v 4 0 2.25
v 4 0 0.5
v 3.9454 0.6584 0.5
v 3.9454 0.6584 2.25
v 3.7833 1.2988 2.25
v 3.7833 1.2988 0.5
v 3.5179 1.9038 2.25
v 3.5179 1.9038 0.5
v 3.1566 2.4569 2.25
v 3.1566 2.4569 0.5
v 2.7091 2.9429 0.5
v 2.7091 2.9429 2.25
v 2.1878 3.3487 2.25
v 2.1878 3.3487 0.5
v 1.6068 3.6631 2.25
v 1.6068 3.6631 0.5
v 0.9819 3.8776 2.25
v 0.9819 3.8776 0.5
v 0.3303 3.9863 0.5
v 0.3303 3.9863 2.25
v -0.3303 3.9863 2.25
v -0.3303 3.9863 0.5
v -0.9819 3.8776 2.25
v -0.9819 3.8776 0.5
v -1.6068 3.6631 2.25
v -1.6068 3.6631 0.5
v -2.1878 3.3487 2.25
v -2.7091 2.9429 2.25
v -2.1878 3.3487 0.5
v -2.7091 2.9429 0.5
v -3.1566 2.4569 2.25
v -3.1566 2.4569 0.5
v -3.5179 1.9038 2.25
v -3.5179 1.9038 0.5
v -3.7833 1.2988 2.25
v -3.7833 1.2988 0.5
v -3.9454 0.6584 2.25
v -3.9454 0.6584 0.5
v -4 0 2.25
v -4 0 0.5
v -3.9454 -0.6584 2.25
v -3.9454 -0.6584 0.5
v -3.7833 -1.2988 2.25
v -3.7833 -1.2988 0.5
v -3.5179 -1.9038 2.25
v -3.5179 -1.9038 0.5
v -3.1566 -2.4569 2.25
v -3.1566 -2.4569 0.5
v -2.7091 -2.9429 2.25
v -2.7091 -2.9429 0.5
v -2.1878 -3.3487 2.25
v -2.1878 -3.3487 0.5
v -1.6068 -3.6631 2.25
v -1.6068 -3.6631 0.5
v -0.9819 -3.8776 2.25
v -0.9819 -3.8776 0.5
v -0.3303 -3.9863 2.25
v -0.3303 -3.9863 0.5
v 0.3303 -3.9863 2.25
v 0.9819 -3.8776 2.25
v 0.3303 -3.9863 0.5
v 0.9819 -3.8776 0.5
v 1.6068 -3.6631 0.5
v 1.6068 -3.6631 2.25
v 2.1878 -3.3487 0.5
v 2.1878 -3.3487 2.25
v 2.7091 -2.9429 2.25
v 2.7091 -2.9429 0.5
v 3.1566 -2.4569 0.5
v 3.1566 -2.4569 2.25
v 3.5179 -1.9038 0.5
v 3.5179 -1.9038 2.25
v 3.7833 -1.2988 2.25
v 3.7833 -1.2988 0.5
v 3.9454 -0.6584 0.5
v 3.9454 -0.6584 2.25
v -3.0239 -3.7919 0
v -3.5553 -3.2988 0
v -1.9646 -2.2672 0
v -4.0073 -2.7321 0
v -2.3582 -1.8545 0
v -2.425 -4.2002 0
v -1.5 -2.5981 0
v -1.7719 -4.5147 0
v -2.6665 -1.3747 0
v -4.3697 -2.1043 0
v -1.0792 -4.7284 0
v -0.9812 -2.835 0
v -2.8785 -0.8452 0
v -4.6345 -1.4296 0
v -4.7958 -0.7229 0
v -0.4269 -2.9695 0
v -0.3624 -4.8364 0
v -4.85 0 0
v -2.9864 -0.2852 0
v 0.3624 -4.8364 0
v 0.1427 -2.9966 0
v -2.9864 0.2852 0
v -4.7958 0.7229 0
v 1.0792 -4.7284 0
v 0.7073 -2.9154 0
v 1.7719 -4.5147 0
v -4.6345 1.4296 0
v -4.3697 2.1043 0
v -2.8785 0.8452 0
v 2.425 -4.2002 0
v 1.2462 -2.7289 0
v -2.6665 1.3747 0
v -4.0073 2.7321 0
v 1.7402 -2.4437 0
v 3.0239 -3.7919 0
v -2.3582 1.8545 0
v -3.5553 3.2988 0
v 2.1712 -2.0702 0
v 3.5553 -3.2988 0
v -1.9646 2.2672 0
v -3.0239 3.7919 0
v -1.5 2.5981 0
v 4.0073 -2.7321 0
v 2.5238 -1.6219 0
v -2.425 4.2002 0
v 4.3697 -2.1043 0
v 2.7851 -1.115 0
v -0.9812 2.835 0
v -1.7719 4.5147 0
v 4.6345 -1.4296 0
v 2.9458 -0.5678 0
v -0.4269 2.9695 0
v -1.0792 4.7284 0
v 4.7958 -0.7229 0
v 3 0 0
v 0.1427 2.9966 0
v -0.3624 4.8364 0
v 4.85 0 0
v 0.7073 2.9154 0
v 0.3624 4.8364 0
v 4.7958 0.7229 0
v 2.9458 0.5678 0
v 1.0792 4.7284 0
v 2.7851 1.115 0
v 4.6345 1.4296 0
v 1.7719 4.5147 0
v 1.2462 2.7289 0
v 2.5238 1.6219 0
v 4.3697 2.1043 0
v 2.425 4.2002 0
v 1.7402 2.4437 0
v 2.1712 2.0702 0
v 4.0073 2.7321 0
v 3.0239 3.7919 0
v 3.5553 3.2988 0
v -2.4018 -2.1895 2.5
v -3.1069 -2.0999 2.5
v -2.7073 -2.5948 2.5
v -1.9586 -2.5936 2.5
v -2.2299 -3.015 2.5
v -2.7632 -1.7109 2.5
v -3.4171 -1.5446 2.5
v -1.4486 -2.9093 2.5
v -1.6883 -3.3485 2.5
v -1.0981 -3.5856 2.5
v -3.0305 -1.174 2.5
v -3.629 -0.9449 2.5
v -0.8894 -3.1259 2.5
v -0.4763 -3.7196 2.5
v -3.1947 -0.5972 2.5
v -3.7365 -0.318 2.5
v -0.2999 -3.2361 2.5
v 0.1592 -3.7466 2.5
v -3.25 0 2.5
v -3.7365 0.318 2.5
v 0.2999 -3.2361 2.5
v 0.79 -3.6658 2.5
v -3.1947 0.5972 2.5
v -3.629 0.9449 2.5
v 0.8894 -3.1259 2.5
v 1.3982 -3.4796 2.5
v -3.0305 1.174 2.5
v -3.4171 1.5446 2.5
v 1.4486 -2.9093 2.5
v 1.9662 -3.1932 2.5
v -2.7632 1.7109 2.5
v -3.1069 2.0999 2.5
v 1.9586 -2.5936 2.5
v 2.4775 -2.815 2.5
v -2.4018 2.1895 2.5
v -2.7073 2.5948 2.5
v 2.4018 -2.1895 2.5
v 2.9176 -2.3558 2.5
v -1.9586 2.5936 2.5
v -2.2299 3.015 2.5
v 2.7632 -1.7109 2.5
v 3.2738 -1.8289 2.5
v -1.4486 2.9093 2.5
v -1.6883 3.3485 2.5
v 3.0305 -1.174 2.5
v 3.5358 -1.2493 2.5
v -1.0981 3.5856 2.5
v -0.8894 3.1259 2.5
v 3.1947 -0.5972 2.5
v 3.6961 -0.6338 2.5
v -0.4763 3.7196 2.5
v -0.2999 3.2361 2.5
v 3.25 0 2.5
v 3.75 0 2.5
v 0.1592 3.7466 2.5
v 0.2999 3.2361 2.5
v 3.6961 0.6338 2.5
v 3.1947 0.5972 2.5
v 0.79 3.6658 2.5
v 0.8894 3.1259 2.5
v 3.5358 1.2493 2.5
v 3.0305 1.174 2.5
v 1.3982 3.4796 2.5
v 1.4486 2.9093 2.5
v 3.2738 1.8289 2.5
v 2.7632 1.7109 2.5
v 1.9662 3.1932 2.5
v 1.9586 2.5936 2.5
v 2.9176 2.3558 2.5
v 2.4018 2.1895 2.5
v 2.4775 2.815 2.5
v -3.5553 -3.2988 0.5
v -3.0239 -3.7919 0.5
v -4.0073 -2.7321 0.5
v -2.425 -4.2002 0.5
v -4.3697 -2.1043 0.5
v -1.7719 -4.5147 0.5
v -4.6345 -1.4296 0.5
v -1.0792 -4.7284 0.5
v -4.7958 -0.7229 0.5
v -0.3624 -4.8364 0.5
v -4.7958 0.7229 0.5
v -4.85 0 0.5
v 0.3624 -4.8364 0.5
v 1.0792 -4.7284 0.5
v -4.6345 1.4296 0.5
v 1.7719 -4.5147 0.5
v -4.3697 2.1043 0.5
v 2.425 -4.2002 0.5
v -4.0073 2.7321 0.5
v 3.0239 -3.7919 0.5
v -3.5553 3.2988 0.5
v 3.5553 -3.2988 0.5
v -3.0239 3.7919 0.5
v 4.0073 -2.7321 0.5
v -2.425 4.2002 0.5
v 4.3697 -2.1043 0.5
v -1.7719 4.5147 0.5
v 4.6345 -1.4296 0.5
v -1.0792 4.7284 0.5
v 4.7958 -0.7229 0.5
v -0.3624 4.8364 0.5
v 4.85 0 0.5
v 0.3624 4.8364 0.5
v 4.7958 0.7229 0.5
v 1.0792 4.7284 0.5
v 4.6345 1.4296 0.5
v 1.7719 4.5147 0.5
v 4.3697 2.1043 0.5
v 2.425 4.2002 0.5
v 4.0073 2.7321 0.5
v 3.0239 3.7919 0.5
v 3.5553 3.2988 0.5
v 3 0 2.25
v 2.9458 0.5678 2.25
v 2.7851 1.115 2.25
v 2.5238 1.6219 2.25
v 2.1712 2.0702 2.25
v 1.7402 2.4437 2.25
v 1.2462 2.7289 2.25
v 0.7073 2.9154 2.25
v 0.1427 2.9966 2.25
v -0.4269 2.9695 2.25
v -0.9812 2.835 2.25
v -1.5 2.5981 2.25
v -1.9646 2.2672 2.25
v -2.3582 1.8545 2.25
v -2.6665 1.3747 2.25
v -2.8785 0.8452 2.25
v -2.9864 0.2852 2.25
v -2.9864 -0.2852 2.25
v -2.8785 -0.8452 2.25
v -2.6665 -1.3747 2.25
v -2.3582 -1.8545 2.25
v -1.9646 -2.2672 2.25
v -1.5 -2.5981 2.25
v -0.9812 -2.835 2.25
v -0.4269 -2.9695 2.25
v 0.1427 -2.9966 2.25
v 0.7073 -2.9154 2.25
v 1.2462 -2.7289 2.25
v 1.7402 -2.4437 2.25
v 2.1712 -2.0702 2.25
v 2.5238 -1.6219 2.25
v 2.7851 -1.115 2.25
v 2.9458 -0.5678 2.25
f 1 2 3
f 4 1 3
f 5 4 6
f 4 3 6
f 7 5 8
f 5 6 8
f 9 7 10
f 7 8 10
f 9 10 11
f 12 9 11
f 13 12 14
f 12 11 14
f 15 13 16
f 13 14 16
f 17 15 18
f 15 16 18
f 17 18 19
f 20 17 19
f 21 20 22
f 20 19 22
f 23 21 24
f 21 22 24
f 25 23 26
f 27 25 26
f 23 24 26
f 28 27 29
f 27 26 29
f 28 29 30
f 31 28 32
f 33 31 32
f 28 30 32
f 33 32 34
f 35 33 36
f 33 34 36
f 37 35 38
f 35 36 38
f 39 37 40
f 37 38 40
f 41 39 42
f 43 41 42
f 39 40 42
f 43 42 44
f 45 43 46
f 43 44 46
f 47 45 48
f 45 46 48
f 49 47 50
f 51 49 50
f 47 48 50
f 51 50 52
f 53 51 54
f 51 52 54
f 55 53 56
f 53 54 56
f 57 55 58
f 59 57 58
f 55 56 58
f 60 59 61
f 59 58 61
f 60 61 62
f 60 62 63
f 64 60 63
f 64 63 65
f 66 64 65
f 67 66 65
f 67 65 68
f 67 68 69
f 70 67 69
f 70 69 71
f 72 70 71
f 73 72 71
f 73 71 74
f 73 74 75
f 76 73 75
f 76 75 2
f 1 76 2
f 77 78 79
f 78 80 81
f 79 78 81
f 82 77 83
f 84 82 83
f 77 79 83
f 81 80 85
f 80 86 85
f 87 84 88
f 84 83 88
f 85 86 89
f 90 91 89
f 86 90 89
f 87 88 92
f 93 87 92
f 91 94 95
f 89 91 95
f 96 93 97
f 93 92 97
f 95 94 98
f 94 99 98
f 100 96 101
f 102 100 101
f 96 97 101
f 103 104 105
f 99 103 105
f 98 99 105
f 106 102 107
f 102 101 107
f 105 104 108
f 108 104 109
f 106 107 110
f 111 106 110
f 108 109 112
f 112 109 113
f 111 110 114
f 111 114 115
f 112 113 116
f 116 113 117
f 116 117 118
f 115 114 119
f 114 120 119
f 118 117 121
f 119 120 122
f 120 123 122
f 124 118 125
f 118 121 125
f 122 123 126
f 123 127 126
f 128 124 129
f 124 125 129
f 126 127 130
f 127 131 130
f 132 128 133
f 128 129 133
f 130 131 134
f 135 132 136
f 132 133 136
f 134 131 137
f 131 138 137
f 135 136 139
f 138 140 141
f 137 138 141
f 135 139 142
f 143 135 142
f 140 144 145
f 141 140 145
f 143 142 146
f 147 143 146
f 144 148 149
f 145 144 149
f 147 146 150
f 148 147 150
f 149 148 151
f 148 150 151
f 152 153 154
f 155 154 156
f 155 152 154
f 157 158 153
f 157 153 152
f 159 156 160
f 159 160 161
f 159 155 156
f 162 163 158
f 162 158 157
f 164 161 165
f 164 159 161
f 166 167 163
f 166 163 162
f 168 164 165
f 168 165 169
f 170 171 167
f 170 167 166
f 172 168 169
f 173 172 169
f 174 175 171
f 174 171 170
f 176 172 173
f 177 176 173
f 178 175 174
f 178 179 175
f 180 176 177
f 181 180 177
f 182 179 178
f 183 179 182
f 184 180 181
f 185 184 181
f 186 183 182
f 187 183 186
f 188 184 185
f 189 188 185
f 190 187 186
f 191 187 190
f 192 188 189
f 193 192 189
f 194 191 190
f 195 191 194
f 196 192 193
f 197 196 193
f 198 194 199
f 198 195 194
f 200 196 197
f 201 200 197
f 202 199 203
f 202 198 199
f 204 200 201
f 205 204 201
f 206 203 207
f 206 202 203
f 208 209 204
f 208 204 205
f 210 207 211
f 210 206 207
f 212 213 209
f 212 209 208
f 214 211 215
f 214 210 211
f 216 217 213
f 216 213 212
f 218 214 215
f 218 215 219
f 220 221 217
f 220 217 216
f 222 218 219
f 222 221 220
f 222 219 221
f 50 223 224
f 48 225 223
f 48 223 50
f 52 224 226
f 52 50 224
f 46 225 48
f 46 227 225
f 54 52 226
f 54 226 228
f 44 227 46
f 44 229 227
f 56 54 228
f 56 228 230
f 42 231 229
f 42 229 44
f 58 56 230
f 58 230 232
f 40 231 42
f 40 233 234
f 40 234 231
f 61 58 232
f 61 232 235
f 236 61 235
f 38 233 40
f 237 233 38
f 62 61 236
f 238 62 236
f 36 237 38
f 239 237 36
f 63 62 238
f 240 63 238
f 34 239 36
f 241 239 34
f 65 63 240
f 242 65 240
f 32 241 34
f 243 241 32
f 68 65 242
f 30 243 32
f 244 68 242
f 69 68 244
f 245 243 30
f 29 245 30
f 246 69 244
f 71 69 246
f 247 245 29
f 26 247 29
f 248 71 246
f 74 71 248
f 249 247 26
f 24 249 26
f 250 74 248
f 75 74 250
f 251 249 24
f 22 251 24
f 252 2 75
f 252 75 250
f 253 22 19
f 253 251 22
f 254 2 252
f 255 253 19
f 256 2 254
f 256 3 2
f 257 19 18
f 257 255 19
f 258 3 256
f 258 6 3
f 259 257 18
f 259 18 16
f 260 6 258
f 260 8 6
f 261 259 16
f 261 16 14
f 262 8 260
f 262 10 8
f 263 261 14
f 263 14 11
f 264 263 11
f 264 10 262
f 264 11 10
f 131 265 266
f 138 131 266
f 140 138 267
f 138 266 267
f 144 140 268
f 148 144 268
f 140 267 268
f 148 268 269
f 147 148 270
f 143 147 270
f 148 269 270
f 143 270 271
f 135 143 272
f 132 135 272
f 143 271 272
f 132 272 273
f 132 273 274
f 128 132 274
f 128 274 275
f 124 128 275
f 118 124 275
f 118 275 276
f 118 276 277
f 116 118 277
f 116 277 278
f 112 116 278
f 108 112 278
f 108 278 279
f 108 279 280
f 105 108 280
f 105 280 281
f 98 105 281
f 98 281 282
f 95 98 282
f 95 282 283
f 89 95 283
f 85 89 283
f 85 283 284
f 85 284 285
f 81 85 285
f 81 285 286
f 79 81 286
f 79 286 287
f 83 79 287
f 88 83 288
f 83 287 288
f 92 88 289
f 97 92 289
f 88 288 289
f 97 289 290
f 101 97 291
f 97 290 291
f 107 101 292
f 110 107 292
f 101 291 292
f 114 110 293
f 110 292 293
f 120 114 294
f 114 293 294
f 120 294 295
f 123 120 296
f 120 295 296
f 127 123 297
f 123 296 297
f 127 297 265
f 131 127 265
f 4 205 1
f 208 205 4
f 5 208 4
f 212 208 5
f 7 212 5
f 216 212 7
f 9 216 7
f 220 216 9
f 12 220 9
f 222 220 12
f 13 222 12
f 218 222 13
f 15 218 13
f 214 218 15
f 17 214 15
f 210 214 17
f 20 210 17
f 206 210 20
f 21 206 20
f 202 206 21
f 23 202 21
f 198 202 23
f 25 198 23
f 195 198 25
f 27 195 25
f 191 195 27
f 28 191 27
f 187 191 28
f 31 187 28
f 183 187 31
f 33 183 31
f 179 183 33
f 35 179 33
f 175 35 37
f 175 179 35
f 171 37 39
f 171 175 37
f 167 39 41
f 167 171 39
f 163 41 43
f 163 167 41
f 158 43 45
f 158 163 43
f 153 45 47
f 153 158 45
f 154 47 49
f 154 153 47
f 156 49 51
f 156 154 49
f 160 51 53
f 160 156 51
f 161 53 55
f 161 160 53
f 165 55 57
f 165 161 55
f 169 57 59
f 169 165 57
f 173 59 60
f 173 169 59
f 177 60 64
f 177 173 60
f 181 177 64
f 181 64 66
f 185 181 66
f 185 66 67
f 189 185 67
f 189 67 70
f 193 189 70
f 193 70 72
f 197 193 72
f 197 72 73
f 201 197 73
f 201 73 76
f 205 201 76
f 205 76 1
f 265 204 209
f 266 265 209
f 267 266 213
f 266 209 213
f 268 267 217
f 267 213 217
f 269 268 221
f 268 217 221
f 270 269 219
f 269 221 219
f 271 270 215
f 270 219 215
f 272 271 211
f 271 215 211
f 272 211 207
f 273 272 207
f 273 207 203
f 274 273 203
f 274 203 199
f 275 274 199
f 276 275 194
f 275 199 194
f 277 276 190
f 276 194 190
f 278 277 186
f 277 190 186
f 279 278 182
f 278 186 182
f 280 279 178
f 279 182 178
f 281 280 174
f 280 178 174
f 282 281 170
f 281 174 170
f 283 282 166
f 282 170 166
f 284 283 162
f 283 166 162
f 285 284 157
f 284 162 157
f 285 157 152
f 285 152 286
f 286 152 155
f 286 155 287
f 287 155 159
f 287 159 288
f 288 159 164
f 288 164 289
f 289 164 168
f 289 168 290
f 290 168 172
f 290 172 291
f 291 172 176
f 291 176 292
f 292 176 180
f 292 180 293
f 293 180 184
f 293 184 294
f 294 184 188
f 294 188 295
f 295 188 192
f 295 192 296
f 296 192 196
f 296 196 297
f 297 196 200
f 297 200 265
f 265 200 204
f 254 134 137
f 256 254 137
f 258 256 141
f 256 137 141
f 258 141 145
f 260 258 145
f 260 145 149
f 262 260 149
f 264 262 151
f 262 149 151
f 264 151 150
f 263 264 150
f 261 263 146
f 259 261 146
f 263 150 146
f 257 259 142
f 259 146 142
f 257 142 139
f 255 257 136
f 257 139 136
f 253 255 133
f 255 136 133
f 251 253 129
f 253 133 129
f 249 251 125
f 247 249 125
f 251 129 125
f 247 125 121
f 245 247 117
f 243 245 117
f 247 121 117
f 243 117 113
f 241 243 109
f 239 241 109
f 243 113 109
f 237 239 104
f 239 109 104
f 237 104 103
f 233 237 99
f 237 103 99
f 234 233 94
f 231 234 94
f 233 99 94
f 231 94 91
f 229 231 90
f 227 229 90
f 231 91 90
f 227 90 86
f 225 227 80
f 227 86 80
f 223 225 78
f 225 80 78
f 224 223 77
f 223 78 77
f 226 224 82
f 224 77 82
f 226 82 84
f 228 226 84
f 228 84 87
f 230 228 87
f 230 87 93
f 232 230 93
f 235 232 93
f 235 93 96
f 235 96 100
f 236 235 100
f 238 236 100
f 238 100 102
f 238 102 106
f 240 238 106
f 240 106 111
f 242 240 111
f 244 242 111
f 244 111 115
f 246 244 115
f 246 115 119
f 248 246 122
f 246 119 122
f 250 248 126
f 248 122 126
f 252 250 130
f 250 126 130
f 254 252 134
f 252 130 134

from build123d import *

# Parameters (mm, degrees)
SKETCH_1_R          = 4.85
EXTRUDE_1_DEPTH     = 0.5
SKETCH_2_R          = 4
EXTRUDE_2_DEPTH     = 2
SKETCH_3_R          = 3
CUT_EXTRUDE_3_DEPTH = 8.300342458
CHAMFER_1_SIZE      = 0.25


with BuildPart() as part:
    # 草圖1 → 伸長1 (new body)
    with BuildSketch(Plane.XY):
        Circle(SKETCH_1_R)
    extrude(amount=EXTRUDE_1_DEPTH)

    # 草圖2 → 伸長2 (add)
    with BuildSketch(Plane.XY.offset(0.5)):
        Circle(SKETCH_2_R)
    extrude(amount=EXTRUDE_2_DEPTH)

    # 草圖3 → 伸長3 (cut, through all)
    with BuildSketch(Plane.XY.offset(2.5)):
        Circle(SKETCH_3_R)
    extrude(amount=-CUT_EXTRUDE_3_DEPTH, mode=Mode.SUBTRACT)

    # 導角1
    chamfer_1_edges = [part.edges().sort_by_distance(p)[0] for p in [
        (-3, 0, 2.5),
        (-4, 0, 2.5),
    ]]
    chamfer(chamfer_1_edges, length=CHAMFER_1_SIZE)


solid = part.part
